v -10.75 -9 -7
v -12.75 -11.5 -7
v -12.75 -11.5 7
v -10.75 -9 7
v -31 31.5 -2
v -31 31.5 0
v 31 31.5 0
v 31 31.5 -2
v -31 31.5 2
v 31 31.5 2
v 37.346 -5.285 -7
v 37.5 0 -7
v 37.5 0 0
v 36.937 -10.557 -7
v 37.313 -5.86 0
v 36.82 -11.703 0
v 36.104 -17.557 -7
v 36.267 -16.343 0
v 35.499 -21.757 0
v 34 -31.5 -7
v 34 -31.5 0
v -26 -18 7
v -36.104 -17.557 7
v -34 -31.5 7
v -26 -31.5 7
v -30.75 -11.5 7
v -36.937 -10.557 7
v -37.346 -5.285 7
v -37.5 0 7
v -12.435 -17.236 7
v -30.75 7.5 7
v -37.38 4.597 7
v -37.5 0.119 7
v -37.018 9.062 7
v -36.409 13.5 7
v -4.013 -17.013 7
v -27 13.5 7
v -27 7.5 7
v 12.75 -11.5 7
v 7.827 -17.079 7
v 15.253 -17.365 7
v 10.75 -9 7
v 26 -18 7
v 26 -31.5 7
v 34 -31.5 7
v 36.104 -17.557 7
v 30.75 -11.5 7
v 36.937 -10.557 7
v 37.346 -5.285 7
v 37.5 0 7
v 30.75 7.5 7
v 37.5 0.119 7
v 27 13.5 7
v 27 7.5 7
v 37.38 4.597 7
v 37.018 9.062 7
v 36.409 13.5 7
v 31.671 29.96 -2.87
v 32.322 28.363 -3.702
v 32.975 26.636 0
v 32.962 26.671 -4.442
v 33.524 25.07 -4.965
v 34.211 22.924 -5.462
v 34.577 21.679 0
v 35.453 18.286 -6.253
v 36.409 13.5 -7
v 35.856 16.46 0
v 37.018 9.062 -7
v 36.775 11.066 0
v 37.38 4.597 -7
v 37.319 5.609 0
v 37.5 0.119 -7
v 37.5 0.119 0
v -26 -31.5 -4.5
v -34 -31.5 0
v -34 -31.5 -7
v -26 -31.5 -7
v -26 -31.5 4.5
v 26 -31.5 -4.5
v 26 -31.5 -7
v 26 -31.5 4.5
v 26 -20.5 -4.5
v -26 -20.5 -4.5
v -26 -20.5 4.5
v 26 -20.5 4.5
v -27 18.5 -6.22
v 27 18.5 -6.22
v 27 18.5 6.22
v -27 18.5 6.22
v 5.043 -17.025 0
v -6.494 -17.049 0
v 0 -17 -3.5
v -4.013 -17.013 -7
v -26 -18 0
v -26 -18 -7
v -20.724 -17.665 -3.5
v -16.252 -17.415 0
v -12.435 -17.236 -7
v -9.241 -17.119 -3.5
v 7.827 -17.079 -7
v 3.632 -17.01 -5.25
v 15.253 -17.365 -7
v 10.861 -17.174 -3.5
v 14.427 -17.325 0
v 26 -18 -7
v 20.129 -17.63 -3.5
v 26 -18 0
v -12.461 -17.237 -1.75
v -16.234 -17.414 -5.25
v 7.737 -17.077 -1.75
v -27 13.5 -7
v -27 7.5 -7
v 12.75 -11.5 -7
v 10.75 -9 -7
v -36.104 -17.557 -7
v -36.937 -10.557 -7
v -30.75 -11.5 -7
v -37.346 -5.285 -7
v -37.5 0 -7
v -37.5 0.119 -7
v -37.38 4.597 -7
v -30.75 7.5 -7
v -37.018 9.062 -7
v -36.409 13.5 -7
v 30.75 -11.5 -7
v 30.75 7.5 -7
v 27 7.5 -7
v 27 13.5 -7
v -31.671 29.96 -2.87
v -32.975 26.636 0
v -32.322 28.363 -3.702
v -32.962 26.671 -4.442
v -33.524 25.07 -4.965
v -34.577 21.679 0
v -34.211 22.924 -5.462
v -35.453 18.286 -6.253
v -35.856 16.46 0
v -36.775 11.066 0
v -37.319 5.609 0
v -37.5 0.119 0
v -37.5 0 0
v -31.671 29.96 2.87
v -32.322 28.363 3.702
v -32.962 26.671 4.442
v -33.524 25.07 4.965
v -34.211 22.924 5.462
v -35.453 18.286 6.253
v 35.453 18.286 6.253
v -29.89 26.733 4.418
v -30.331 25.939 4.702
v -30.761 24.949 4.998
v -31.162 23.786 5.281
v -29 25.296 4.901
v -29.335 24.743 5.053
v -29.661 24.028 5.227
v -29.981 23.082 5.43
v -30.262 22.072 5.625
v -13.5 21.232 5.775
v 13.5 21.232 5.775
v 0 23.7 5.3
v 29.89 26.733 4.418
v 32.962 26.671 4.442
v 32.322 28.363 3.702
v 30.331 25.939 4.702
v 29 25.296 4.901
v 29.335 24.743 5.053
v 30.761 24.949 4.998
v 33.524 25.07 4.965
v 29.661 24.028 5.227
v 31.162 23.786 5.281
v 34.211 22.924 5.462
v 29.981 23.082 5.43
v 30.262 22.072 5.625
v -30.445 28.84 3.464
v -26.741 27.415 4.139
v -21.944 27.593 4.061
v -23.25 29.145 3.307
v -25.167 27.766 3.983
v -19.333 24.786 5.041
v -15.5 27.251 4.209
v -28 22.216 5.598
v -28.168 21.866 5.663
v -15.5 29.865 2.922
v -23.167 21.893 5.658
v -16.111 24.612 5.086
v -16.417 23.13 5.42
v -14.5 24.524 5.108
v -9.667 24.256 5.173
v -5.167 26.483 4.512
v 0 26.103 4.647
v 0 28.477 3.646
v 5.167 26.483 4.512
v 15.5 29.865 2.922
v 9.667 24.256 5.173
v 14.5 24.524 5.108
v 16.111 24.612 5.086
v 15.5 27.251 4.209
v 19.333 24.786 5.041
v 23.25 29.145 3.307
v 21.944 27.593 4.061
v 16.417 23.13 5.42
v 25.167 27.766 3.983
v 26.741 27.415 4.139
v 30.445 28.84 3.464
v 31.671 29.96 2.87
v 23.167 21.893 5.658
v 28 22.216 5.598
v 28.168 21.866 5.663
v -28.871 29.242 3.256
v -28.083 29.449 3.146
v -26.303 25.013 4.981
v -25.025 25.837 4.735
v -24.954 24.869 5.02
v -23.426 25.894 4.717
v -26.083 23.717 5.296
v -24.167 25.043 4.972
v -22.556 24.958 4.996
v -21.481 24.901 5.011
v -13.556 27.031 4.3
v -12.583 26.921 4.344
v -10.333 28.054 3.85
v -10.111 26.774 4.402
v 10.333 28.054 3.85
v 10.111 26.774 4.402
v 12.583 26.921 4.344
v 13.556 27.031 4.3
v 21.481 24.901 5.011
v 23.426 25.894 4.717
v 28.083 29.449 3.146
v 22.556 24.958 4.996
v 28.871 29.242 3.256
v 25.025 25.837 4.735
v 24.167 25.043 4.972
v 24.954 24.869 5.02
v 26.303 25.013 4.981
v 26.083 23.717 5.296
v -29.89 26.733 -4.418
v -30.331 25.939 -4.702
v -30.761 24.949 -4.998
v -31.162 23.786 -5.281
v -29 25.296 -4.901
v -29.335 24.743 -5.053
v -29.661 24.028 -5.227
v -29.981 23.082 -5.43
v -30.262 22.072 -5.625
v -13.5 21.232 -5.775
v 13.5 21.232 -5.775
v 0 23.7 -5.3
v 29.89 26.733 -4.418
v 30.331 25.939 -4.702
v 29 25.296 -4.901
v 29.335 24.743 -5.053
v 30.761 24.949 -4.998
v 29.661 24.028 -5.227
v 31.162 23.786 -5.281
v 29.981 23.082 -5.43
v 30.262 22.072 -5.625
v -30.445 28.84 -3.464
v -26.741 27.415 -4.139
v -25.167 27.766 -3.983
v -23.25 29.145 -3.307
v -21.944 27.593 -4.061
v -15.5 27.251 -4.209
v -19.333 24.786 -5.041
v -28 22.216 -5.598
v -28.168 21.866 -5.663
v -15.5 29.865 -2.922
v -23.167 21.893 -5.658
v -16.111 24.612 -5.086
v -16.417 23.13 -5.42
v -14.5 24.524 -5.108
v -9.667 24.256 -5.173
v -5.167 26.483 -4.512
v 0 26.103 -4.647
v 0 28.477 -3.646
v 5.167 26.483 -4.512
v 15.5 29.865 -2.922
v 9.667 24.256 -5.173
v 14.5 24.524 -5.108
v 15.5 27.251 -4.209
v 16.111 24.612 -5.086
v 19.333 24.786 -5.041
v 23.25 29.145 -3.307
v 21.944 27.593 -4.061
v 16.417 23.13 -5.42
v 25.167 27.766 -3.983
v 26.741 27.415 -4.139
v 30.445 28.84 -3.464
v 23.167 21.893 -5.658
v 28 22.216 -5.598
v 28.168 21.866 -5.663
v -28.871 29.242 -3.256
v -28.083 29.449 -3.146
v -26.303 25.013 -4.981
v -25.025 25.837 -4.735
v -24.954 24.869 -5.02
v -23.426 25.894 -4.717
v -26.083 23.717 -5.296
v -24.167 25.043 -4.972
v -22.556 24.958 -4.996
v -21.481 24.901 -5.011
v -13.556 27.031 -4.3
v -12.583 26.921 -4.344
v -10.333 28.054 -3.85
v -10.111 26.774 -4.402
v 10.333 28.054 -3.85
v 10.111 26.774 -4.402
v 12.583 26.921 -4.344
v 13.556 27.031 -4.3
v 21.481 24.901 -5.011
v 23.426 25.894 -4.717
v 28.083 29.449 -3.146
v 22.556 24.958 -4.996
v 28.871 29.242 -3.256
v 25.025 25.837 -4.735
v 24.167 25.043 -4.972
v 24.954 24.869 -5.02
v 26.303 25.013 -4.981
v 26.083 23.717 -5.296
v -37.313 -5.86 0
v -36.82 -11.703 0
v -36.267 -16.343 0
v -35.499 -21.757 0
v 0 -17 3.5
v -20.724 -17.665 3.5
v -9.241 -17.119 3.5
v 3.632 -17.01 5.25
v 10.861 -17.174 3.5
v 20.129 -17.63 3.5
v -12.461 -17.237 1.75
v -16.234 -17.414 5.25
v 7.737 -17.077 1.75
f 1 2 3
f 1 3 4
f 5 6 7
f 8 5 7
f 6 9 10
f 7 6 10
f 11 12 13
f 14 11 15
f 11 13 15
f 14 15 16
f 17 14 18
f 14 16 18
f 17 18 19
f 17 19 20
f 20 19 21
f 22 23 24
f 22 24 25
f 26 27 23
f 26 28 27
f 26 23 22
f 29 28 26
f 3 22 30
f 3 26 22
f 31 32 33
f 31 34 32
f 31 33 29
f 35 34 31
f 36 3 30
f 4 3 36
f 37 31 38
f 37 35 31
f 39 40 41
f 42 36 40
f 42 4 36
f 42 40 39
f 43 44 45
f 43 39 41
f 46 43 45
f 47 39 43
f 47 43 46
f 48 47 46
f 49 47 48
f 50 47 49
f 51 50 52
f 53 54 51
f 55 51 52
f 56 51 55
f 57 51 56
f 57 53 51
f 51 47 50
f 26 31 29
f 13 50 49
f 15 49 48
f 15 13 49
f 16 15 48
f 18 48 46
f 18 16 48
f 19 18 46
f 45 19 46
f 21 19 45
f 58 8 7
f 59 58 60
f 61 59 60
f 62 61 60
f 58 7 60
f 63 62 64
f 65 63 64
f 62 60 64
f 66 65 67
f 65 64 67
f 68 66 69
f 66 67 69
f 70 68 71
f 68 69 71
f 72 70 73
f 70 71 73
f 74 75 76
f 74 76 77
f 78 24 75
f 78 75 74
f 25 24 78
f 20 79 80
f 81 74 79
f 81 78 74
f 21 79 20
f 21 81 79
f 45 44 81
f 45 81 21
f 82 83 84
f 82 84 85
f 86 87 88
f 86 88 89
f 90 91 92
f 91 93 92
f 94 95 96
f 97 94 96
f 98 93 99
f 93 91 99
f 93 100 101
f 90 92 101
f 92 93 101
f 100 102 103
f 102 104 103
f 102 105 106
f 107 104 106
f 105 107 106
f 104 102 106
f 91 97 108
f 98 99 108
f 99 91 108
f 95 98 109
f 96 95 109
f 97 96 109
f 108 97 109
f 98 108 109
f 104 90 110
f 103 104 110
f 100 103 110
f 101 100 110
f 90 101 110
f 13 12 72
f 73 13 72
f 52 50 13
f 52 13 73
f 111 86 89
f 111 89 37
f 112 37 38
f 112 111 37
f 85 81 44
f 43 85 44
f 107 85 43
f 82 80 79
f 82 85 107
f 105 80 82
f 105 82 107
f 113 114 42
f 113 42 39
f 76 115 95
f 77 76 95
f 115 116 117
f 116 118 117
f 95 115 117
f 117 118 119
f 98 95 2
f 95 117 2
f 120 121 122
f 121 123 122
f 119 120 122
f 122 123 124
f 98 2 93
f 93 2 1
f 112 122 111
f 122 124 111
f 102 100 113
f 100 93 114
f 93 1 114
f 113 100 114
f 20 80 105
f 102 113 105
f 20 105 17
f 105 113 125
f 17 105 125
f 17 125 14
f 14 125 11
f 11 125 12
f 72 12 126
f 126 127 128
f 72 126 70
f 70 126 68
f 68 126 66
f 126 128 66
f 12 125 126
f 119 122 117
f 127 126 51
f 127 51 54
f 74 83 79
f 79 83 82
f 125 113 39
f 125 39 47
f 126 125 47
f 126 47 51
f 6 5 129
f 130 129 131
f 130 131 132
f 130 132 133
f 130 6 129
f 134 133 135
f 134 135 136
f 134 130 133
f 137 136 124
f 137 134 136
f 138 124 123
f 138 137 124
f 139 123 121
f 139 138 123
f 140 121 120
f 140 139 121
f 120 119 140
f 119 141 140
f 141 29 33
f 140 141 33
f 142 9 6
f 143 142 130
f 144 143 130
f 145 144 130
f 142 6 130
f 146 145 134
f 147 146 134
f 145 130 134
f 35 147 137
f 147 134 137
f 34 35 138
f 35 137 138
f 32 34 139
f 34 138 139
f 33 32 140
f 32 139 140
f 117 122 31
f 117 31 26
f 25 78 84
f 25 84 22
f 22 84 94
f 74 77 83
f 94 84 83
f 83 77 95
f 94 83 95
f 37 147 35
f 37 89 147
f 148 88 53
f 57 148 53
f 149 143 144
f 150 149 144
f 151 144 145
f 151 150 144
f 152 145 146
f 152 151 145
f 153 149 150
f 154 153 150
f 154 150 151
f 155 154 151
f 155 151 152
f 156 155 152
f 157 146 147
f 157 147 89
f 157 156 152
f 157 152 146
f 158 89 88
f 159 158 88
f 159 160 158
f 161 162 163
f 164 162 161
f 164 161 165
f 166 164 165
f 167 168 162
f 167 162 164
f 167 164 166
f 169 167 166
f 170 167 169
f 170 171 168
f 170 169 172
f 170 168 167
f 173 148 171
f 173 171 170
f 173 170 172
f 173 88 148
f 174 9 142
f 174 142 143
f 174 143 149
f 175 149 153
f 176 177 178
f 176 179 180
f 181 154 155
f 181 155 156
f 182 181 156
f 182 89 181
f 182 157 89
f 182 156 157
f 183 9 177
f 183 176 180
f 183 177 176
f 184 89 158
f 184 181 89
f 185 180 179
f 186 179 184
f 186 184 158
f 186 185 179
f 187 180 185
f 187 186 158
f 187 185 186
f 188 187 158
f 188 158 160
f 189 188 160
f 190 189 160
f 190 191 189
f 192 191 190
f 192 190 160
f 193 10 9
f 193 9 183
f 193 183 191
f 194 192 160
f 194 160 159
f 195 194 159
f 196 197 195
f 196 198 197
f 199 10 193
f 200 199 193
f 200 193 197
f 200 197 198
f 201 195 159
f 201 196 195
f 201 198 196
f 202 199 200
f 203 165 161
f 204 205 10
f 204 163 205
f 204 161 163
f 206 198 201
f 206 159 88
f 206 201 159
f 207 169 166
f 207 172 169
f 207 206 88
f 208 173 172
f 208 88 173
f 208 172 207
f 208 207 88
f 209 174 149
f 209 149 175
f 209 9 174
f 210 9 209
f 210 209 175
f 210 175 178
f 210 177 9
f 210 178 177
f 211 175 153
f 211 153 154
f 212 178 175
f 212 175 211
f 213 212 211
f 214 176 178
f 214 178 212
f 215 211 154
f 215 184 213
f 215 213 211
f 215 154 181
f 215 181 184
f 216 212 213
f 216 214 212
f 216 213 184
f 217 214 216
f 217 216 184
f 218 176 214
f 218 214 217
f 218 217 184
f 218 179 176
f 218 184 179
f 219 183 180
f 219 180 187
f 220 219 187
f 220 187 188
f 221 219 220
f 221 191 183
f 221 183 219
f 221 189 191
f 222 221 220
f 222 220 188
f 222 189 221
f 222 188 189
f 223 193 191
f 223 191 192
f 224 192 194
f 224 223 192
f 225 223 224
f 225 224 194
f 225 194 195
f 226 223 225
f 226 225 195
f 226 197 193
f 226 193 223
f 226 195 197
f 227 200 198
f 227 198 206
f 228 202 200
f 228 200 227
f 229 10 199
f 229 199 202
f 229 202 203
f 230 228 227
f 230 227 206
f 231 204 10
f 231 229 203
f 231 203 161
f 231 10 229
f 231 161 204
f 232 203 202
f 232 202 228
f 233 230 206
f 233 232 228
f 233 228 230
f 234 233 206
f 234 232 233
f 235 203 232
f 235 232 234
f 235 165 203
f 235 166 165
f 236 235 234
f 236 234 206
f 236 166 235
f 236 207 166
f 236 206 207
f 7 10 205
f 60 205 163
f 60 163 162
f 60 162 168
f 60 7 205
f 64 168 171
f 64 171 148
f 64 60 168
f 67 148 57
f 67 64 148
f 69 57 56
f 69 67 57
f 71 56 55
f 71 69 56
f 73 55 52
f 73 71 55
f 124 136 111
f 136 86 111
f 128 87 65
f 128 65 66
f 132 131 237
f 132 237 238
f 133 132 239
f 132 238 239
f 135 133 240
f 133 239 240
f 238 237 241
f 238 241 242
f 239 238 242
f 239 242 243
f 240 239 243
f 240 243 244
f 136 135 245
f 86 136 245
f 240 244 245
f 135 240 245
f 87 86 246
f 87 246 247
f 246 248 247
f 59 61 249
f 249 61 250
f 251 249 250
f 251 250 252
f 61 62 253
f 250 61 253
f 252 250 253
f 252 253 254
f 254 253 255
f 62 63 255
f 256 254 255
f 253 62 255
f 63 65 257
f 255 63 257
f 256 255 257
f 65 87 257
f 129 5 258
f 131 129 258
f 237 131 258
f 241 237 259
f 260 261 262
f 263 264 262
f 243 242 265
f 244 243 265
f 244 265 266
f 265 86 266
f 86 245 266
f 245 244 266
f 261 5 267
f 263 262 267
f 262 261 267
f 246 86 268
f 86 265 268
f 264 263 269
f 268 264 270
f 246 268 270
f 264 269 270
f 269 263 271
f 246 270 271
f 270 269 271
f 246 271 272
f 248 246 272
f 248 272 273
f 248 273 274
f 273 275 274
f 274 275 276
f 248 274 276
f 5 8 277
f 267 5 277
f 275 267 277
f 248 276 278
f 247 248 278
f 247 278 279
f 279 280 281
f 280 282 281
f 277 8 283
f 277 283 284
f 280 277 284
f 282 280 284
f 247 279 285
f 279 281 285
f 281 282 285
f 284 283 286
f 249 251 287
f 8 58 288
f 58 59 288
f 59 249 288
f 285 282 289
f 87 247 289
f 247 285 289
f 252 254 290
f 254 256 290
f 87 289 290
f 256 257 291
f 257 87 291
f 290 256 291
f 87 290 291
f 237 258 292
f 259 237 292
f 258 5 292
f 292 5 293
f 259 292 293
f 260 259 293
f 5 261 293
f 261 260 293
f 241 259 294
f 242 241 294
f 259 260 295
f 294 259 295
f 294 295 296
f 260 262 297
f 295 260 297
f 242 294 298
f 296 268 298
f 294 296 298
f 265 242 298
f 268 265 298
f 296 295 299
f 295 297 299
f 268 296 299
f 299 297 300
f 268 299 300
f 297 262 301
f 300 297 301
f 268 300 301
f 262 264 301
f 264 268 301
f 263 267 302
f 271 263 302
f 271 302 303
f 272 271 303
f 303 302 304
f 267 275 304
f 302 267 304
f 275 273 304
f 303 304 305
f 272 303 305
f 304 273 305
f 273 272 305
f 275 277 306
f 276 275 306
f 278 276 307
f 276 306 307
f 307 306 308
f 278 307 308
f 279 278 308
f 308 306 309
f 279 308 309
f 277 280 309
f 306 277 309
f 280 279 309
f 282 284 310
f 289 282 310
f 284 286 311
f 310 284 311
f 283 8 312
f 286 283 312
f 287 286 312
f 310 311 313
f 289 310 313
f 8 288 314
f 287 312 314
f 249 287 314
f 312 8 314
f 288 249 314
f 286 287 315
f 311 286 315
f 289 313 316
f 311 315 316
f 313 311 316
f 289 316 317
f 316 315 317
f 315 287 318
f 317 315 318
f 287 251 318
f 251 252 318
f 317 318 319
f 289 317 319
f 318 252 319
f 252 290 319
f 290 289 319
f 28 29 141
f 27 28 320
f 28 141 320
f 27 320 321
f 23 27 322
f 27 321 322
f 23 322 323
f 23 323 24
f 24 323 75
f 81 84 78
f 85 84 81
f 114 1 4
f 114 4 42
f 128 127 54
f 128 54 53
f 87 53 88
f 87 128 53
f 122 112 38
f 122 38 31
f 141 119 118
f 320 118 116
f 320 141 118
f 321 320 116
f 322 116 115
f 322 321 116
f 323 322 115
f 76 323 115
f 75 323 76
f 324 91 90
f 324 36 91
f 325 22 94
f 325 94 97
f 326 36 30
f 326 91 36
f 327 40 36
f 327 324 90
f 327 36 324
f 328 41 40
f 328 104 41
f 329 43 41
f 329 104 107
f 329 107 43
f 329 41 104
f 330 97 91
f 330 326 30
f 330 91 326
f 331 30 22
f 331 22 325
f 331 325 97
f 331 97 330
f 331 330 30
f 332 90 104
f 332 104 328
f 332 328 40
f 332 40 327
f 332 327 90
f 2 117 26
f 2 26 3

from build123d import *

# Parameters (mm, degrees)
F0_W      = 75
F0_H      = 63
F1_DEPTH  = 7
F3_DEPTH  = 25
F5_DEPTH  = 25
F7_W      = 52
F7_H      = 11
F8_DEPTH  = 2.5
F10_DEPTH = 80
F12_DEPTH = 25


with BuildPart() as f1:
    # F0 (on Top) → F1 (new body)
    with BuildSketch(Plane.XY):
        Rectangle(F0_W, F0_H)
    extrude(amount=F1_DEPTH)

    # F2 (on face) → F3 (cut)
    with BuildSketch(Plane.XY.offset(7)):
        Polygon((27, 18.5), (-27, 18.5), (-27, 7.5), (-30.75, 7.5), (-30.75, -11.5), (-12.75, -11.5), (-10.75, -9), (10.75, -9), (12.75, -11.5), (30.75, -11.5), (30.75, 7.5), (27, 7.5), align=None)
    extrude(amount=-F3_DEPTH, mode=Mode.SUBTRACT)

    # F4 (on face) → F5 (cut)
    with BuildSketch(Plane.XY.offset(7)):
        with BuildLine():
            Line((-26, -18), (-26, -20.5))
            Line((-26, -20.5), (26, -20.5))
            Line((26, -20.5), (26, -18))
            add(Edge.make_bspline(
                [(-26, -18), (-11, -17), (0, -17), (11, -17), (26, -18)],
                knots=[0, 0, 0, 0, 0.5, 1, 1, 1, 1], degree=3))
        make_face()
    extrude(amount=-F5_DEPTH, mode=Mode.SUBTRACT)

    # F7 (on face) → F8 (cut)
    with BuildSketch(Plane.XY.offset(7)):
        with Locations((0, -26)):
            Rectangle(F7_W, F7_H)
    extrude(amount=-F8_DEPTH, mode=Mode.SUBTRACT)

    # F9 (on face) → F10 (cut)
    with BuildSketch(Plane.YZ.offset(37.5)):
        with BuildLine():
            Line((-31.5, 11.1092058942), (-31.5, 7))
            Line((-31.5, 7), (13.5, 7))
            add(Edge.make_bspline(
                [(31.5, 2), (27.9249660671, 4.0678475052), (24.5989065318, 5.4442587825), (16.5555038096, 6.4860110295), (13.5, 7)],
                knots=[0, 0, 0, 0, 0.4750633648, 1, 1, 1, 1], degree=3))
            Line((31.5, 2), (31.5, 11.1092058942))
            Line((31.5, 11.1092058942), (-31.5, 11.1092058942))
        make_face()
    extrude(amount=-F10_DEPTH, mode=Mode.SUBTRACT)

    # F11 (on Top) → F12 (cut)
    with BuildSketch(Plane.XY):
        with BuildLine():
            add(Edge.make_bspline(
                [(-31, 31.5), (-35.5, 21.5), (-39.5000541268, 0.1581786089), (-35.5, -21.5), (-34, -31.5)],
                knots=[0, 0, 0, 0, 0.5018392613, 1, 1, 1, 1], degree=3))
            Line((-31, 31.5), (-43.3181733368, 37.5741338942))
            Line((-43.3181733368, 37.5741338942), (-41.833250428, -36.0357076911))
            Line((-41.833250428, -36.0357076911), (-34, -31.5))
        make_face()
        with BuildLine():
            Line((39.6972207541, 40.7548360527), (31.0000020678, 31.5))
            add(Edge.make_bspline(
                [(31.0000020678, 31.5), (35.5, 21.5), (39.5000541267, 0.1581784693), (35.5, -21.5), (34, -31.5)],
                knots=[0, 0, 0, 0, 0.5018392596, 1, 1, 1, 1], degree=3))
            Line((34, -31.5), (45.6182770431, -33.850427717))
            Line((45.6182770431, -33.850427717), (39.6972207541, 40.7548360527))
        make_face()
    extrude(amount=F12_DEPTH, mode=Mode.SUBTRACT)

    # F13: F1 across plane


with BuildPart() as f1_1:
    add(f1.part)
    add(f1.part.mirror(Plane.XY))


solid = f1_1.part
